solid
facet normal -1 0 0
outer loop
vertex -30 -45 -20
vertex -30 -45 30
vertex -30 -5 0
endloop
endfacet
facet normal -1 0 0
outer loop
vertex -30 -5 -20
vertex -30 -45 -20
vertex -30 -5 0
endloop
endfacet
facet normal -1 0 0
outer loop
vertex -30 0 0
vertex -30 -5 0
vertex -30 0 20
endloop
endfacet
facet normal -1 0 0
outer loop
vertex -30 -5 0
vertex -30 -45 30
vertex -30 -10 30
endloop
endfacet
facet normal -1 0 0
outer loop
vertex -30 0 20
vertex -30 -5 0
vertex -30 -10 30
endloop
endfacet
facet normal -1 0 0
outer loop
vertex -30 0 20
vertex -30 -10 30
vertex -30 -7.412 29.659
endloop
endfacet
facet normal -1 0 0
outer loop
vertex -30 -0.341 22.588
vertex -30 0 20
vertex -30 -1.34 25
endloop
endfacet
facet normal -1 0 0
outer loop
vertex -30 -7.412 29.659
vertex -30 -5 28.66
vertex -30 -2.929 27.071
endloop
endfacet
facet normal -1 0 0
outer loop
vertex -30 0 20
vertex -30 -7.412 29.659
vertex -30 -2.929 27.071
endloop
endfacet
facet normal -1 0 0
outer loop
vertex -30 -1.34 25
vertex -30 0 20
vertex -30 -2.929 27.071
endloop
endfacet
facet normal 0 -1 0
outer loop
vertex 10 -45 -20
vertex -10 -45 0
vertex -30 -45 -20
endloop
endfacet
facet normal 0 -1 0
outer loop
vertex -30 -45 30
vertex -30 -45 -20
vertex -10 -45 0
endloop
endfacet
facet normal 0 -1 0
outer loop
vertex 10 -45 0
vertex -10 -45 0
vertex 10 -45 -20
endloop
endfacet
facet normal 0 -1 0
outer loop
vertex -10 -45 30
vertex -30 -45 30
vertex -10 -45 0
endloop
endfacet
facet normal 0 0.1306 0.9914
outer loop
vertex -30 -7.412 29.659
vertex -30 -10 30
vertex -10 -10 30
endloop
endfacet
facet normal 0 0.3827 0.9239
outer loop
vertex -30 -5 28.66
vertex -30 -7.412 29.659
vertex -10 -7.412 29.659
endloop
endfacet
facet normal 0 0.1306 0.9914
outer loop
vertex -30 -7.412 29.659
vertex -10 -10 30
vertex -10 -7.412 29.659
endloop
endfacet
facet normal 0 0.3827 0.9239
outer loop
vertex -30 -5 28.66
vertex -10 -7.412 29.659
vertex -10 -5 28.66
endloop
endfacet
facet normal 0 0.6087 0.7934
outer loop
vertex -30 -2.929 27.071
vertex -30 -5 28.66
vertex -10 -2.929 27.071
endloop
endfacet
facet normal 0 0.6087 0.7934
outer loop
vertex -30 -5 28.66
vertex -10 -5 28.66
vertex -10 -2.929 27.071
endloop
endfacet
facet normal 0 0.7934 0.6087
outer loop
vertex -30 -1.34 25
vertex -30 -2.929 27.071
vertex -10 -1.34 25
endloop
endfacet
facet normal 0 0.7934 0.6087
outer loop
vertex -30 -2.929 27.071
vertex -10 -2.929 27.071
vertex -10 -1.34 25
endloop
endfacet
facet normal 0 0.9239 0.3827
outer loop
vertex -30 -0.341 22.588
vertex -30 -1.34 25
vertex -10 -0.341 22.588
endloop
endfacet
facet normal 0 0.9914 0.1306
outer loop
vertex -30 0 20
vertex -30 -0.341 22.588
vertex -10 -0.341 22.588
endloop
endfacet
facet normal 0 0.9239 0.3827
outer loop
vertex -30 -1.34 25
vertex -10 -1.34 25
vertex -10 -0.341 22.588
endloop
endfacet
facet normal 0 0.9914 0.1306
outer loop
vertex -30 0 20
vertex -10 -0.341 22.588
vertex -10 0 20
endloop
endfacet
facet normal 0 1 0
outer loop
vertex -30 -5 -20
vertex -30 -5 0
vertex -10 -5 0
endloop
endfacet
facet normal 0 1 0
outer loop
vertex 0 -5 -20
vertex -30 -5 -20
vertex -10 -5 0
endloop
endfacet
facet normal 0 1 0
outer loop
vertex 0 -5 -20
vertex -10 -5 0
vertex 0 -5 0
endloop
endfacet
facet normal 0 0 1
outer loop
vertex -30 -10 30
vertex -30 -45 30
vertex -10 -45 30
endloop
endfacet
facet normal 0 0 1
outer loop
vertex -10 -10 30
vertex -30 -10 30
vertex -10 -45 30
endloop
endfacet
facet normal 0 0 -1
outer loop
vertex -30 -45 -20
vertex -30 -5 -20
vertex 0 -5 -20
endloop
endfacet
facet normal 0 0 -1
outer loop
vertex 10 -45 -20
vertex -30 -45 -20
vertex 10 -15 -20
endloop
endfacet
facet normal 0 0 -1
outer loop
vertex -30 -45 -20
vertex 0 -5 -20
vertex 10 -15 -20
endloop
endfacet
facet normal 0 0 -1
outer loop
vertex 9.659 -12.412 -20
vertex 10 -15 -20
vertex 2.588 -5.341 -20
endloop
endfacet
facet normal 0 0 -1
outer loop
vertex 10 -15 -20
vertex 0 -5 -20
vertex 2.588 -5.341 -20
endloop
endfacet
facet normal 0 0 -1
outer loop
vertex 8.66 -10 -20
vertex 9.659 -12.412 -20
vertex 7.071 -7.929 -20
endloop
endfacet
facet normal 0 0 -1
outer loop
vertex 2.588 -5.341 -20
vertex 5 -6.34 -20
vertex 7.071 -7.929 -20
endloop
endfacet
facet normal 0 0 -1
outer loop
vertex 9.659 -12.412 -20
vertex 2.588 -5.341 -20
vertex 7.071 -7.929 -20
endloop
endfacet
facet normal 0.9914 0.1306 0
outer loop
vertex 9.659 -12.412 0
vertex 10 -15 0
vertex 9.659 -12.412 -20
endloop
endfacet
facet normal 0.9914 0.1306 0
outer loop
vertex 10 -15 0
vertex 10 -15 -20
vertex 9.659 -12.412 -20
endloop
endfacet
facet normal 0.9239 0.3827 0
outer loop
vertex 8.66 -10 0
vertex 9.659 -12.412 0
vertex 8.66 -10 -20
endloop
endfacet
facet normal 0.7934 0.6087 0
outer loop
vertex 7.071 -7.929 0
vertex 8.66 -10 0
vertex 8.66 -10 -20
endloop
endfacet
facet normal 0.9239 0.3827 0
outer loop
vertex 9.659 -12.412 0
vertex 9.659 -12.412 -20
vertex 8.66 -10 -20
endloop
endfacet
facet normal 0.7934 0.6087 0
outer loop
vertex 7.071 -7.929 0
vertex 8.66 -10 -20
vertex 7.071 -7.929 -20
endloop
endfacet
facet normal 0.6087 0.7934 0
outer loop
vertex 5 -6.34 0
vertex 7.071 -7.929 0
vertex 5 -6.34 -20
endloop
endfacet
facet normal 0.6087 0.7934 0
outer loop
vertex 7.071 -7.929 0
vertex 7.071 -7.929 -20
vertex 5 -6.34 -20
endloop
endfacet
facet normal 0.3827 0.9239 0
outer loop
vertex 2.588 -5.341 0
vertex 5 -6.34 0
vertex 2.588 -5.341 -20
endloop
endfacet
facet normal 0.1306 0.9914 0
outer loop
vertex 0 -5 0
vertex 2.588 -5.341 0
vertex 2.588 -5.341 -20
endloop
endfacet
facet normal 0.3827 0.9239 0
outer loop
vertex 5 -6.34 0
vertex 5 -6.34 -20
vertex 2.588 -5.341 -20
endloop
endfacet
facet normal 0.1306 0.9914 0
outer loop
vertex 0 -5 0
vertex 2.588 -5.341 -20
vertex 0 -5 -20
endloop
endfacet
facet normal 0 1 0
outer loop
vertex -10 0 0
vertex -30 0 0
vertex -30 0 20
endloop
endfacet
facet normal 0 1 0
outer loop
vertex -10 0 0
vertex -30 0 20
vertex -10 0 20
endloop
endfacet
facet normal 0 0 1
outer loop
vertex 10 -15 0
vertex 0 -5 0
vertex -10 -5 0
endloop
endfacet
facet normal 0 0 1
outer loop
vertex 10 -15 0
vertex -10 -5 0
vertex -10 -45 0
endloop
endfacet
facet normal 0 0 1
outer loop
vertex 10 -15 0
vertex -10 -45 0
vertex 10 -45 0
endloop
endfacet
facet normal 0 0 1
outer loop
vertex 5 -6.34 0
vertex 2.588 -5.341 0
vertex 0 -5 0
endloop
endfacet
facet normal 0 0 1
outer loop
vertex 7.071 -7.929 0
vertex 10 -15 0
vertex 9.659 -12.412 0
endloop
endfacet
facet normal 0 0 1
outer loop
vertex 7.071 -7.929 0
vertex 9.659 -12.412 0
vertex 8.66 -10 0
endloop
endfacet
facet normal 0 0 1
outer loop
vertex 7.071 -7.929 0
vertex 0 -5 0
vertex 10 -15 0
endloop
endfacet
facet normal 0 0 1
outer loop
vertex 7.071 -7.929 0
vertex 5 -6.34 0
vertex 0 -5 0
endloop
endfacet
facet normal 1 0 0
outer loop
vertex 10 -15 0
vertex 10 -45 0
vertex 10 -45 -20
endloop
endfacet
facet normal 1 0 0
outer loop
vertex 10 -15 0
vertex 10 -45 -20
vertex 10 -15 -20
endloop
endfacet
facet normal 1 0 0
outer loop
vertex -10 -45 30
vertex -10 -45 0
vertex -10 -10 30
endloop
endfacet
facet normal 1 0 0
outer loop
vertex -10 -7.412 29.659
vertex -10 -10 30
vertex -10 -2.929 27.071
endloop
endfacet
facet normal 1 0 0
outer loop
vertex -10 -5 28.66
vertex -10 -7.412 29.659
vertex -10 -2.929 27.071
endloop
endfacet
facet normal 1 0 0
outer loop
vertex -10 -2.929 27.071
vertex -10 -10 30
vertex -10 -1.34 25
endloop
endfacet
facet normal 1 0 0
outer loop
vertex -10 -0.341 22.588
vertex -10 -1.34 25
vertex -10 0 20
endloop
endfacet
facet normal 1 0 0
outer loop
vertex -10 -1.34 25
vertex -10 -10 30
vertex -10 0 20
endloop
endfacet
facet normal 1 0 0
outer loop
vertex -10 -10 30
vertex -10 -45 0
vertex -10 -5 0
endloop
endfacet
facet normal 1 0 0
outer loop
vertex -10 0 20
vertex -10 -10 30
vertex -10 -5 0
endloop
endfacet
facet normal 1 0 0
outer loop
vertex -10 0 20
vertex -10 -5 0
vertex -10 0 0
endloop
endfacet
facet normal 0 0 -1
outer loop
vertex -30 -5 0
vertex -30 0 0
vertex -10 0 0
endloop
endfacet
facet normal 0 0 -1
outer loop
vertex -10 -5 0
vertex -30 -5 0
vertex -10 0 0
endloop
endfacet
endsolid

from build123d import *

# Parameters (mm, degrees)
SKETCH1_W           = 20
SKETCH1_H           = 45
BOSS_EXTRUDE1_DEPTH = 30
SKETCH2_W           = 40
SKETCH2_H           = 40
BOSS_EXTRUDE2_DEPTH = 20
FILLET1_R           = 10


with BuildPart() as part:
    # Sketch1 → Boss-Extrude1 (new body)
    with BuildSketch(Plane.XY):
        with Locations((-20, -22.5)):
            Rectangle(SKETCH1_W, SKETCH1_H)
    extrude(amount=BOSS_EXTRUDE1_DEPTH)

    # Sketch2 → Boss-Extrude2 (add)
    with BuildSketch(Plane.XY):
        with Locations((-10, -25)):
            Rectangle(SKETCH2_W, SKETCH2_H)
    extrude(amount=-BOSS_EXTRUDE2_DEPTH)

    # Fillet1
    fillet1_edges = [part.edges().sort_by_distance(p)[0] for p in [
        (10, -5, -10),
        (-20, 0, 30),
    ]]
    fillet(fillet1_edges, radius=FILLET1_R)


solid = part.part
